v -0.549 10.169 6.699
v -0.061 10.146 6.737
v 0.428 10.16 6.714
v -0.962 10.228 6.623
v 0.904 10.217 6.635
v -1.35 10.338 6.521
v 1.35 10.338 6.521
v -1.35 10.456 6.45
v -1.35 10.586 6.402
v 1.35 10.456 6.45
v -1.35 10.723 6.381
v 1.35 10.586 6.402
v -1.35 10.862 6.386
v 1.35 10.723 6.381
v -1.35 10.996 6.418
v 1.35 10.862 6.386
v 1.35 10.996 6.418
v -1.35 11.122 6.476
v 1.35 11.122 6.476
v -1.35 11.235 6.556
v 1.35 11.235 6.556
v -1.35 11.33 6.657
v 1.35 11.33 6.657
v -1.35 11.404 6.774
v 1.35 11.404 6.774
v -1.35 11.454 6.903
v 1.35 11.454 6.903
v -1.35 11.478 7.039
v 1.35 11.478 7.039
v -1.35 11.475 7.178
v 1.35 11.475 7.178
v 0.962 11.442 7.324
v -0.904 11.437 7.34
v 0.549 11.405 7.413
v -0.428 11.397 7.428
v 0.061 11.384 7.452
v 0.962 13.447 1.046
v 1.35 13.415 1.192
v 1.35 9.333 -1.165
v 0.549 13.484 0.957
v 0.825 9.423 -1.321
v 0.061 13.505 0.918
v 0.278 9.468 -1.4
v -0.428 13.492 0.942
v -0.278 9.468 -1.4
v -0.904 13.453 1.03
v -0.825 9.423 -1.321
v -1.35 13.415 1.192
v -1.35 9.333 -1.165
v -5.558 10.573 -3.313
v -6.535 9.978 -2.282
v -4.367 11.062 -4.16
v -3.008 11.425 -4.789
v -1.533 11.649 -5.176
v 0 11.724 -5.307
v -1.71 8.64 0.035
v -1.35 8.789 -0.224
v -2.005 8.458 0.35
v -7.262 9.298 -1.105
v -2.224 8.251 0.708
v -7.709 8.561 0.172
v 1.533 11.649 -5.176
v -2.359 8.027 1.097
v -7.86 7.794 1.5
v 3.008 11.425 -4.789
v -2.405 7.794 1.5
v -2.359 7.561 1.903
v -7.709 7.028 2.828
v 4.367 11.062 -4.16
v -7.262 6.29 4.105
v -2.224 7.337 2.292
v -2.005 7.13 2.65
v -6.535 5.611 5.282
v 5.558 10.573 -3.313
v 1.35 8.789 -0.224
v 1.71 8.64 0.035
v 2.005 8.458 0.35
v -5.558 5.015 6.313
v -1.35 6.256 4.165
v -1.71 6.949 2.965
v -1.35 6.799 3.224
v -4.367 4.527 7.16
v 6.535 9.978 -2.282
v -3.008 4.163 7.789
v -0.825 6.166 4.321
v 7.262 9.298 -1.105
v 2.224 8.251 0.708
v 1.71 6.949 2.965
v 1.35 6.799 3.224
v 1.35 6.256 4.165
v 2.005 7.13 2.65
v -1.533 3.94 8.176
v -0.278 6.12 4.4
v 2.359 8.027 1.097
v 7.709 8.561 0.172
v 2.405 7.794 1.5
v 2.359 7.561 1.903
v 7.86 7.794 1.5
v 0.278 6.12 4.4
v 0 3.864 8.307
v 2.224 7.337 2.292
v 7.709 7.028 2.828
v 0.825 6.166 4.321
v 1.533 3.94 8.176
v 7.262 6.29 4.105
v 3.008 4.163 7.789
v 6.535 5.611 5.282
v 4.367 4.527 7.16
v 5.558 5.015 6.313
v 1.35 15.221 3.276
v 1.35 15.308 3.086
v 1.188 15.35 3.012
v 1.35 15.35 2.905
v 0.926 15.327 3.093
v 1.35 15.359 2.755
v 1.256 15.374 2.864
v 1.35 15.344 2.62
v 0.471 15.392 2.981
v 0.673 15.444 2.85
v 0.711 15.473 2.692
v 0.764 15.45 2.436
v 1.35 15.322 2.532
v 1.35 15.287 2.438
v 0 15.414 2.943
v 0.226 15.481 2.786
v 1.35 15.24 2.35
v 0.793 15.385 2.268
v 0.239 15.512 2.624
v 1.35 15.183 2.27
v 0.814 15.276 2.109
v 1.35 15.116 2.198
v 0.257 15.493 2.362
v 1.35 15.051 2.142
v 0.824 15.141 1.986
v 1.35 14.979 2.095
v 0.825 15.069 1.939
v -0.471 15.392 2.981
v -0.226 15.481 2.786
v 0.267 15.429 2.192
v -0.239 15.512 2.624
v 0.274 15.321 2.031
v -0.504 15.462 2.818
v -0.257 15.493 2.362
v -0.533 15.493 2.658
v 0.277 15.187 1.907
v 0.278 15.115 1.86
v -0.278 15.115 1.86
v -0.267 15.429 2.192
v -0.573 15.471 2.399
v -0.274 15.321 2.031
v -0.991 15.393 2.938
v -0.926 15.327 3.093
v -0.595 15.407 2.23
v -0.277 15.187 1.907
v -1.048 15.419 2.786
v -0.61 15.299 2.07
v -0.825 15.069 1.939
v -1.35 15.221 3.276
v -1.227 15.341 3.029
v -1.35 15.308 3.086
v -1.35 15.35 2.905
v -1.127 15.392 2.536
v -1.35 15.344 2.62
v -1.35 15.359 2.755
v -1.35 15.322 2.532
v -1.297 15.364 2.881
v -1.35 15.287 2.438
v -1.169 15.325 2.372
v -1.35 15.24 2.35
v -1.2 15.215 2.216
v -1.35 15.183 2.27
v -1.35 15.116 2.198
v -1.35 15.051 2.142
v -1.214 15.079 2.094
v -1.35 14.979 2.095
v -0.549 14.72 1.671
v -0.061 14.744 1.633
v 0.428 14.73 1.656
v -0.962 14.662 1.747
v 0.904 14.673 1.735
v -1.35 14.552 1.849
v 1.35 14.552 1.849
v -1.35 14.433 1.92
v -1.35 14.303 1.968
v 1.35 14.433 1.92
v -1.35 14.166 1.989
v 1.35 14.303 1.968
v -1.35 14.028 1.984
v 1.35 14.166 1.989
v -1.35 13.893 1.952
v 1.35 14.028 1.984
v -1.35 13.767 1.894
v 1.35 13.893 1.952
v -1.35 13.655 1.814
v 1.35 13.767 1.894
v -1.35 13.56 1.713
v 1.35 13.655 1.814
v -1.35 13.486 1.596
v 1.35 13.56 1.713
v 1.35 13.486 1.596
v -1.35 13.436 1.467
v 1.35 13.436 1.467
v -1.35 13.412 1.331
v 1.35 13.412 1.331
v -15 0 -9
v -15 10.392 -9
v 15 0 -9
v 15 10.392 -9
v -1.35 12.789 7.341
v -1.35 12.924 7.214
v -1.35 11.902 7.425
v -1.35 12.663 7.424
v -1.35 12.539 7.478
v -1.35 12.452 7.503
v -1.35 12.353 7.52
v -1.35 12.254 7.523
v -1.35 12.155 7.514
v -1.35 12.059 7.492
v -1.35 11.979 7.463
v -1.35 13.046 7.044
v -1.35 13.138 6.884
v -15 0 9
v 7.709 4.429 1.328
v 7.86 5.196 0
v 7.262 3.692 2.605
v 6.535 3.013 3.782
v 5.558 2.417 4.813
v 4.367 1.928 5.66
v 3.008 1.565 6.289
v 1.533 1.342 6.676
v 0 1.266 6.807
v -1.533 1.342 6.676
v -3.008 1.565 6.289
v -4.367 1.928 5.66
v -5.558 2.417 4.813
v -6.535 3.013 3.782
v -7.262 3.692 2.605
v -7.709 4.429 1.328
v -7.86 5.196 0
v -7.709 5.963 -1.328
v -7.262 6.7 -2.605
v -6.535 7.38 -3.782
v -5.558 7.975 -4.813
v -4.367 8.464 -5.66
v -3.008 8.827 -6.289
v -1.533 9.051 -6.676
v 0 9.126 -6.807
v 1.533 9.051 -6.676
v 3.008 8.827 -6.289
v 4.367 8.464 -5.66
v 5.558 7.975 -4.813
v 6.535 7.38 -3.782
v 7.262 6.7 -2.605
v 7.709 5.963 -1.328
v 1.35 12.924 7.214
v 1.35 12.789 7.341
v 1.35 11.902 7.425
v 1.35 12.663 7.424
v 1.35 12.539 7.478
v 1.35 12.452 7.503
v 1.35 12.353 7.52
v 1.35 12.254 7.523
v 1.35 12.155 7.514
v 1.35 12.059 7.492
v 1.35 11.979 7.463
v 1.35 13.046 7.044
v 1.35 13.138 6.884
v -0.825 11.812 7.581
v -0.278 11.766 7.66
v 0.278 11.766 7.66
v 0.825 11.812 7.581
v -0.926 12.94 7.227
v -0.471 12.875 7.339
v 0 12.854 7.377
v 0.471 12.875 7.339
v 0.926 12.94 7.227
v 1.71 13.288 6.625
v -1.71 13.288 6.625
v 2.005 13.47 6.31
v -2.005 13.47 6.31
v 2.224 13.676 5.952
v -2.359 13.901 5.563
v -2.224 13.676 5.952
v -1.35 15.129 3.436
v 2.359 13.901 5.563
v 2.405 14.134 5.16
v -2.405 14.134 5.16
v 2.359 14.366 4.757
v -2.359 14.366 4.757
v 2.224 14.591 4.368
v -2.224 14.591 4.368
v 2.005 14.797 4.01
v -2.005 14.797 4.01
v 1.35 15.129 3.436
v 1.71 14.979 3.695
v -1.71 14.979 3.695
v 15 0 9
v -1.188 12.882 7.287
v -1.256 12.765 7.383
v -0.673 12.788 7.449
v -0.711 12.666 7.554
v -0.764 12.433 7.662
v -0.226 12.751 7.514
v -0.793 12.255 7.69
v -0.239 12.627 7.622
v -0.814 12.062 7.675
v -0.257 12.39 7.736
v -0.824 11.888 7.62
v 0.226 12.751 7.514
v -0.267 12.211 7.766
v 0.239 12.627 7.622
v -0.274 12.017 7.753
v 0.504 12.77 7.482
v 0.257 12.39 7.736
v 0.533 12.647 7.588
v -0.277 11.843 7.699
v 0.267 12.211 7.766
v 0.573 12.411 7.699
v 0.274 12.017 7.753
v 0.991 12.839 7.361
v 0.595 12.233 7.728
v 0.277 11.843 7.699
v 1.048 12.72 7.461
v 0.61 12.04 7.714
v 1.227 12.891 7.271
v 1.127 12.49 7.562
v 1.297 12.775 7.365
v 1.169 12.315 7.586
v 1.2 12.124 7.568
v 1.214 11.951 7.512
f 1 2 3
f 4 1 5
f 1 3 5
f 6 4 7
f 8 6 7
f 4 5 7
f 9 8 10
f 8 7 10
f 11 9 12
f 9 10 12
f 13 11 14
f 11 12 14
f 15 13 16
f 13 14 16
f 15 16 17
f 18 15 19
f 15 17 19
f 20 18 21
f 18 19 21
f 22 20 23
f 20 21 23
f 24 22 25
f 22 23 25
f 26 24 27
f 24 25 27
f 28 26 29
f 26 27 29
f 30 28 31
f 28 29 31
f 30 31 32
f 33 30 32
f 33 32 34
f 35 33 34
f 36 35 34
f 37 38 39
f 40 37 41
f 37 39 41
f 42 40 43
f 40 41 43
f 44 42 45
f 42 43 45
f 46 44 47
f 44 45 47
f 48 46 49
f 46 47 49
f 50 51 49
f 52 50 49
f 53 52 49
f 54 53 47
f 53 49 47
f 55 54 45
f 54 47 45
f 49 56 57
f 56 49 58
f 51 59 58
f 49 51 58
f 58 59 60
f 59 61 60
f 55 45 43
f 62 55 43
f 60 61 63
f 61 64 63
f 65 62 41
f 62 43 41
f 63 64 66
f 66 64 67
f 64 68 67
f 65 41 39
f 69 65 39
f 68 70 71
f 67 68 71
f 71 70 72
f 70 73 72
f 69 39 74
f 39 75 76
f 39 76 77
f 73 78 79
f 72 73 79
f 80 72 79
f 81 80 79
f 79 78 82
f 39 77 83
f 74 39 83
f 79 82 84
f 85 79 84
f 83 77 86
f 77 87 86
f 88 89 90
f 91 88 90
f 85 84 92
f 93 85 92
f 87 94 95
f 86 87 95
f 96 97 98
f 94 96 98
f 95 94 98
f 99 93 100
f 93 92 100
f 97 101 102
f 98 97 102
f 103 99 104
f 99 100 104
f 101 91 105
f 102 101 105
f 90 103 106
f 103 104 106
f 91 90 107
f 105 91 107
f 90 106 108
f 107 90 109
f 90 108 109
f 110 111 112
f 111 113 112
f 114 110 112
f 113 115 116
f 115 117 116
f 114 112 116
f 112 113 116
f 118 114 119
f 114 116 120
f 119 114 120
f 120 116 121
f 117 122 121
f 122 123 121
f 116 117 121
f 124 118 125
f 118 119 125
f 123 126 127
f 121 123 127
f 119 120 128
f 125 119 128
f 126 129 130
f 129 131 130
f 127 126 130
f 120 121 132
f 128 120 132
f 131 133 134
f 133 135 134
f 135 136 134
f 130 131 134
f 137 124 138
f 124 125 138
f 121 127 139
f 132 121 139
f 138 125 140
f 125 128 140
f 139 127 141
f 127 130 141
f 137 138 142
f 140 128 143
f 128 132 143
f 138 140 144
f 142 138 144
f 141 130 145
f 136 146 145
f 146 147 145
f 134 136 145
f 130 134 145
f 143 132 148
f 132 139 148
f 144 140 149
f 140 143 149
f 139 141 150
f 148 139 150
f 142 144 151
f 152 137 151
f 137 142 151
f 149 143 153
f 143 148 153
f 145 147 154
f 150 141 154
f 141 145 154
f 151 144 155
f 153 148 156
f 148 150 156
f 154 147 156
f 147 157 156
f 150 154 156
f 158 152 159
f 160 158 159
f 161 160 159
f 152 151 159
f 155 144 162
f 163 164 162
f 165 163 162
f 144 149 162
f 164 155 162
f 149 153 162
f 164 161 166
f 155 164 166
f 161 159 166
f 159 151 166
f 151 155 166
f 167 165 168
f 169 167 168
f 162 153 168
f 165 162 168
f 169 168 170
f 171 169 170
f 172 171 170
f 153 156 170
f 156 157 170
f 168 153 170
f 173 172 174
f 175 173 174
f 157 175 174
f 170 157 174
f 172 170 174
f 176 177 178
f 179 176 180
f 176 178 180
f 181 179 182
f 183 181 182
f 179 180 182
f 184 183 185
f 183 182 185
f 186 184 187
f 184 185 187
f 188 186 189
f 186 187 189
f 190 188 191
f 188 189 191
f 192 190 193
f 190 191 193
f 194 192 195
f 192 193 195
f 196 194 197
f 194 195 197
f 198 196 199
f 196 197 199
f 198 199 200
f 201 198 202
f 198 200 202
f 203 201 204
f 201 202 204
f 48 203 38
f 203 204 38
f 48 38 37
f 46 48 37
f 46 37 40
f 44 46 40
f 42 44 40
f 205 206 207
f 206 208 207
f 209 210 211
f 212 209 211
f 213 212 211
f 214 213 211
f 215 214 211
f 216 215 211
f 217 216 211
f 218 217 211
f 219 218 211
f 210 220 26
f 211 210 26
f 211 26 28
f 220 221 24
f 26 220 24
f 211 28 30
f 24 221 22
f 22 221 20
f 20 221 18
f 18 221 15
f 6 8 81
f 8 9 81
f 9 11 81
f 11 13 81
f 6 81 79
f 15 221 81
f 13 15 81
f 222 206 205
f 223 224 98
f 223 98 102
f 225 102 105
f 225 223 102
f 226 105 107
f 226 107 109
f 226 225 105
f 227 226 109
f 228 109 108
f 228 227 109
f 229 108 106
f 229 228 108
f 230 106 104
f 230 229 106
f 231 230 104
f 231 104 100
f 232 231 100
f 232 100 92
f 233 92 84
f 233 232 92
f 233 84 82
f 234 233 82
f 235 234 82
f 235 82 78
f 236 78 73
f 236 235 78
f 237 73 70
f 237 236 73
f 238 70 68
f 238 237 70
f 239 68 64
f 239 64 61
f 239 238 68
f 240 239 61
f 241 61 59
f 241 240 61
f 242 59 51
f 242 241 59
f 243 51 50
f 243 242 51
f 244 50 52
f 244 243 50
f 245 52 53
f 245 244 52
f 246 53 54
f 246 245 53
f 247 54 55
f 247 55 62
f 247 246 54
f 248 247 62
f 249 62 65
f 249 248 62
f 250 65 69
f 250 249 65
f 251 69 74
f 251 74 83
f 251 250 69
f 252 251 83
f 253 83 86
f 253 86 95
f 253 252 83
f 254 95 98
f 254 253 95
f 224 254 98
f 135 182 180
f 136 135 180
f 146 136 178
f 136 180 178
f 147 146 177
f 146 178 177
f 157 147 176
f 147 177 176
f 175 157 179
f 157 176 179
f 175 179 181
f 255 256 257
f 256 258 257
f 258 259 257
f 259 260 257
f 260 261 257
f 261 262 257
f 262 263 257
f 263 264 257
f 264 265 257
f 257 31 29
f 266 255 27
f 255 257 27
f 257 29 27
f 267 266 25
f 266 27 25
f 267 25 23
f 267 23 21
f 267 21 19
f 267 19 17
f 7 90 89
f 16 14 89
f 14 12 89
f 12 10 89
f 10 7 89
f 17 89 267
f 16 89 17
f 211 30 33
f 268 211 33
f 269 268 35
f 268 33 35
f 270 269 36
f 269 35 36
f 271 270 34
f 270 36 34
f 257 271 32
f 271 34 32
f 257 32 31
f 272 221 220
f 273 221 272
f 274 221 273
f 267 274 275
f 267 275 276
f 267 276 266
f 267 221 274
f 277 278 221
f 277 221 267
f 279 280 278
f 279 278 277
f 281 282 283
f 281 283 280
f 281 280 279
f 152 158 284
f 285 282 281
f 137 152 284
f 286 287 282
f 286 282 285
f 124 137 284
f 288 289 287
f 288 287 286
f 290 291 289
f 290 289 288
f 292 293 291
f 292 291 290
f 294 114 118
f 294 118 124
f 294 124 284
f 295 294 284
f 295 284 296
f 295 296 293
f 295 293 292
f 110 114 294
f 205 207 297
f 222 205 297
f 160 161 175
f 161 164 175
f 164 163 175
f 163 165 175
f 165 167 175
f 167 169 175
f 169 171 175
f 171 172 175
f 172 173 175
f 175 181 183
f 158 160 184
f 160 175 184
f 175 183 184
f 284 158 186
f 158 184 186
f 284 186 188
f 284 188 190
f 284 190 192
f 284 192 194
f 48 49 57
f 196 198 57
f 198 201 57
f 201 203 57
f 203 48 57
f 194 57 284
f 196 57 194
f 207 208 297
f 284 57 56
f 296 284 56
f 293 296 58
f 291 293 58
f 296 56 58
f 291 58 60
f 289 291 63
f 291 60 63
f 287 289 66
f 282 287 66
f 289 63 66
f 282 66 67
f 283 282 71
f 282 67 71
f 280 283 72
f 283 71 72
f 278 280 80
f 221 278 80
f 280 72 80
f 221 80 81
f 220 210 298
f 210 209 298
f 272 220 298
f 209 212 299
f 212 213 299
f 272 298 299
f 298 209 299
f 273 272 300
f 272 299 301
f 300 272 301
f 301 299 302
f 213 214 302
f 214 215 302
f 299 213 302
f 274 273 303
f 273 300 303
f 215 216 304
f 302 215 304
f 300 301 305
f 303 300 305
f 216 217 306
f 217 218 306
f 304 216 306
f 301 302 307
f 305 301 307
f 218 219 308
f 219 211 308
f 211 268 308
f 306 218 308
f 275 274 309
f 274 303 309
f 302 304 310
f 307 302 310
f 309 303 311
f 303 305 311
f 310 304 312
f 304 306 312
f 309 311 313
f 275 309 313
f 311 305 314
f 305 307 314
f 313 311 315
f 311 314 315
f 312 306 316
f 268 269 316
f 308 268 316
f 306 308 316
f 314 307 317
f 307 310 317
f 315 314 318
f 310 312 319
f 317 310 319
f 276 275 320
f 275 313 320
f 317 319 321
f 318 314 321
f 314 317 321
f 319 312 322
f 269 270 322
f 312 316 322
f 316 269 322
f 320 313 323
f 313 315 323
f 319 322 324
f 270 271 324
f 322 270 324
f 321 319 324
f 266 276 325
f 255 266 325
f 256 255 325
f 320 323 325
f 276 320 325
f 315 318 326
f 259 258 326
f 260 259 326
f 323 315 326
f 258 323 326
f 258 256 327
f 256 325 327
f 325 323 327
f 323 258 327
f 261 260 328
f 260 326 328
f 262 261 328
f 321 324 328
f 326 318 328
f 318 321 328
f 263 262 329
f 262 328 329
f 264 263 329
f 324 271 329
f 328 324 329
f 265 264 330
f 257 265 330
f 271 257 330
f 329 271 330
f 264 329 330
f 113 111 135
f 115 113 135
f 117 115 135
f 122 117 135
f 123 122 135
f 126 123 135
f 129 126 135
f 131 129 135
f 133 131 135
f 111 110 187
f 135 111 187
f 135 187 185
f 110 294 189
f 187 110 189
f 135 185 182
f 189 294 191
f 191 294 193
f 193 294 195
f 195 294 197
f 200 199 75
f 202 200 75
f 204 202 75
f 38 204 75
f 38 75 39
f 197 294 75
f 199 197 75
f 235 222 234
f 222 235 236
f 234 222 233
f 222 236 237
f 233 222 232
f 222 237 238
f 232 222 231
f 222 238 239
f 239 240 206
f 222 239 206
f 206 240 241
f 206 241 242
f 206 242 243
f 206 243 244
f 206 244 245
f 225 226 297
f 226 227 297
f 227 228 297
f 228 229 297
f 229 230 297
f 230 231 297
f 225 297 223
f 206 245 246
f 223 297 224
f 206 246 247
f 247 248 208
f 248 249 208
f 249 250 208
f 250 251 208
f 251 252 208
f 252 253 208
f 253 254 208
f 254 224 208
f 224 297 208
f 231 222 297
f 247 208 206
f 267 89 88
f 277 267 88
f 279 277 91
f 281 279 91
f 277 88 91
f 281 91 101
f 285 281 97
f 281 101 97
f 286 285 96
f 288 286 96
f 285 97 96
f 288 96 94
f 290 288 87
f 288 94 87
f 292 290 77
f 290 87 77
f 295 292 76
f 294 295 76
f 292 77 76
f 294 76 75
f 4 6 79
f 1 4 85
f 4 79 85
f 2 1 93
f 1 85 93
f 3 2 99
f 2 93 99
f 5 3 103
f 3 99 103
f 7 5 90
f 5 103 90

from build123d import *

# Parameters (mm, degrees)
BOSS_EXTRUDE4_DEPTH = 15
SKETCH3_R           = 7.86
BOSS_EXTRUDE2_DEPTH = 3
BOSS_EXTRUDE3_DEPTH = 7.32
SKETCH6_R           = 0.715
CUT_EXTRUDE2_DEPTH  = 17.35
FILLET5_R           = 0.8


with BuildPart() as part:
    # Sketch8 → Boss-Extrude4 (new body, symmetric)
    with BuildSketch(Plane(origin=(0, 0, 0), x_dir=(0, 0, -1), z_dir=(1, 0, 0))):
        Polygon((-9, 0), (9, 10.392304845), (9, 0), align=None)
    extrude(amount=BOSS_EXTRUDE4_DEPTH, both=True)

    # Sketch3 → Boss-Extrude2 (add)
    with BuildSketch(Plane(origin=(0, 1.640246968, 6.159008915), x_dir=(1, 0, 0), z_dir=(0, -0.866025404, -0.5))):
        with Locations((0, -7.11181091)):
            Circle(SKETCH3_R)
    extrude(amount=-BOSS_EXTRUDE2_DEPTH)

    # Sketch5 → Boss-Extrude3 (add)
    with BuildSketch(Plane(origin=(0, 6.495190528, 3.75), x_dir=(1, 0, 0), z_dir=(0, 0.866025404, 0.5))):
        with BuildLine():
            Line((1.35, 4.588434219), (1.35, 5.674941499))
            ThreePointArc((1.35, 5.674941499), (0, 5.958076211), (-1.35, 5.674941499))
            Line((-1.35, 5.674941499), (-1.35, 4.588434219))
            ThreePointArc((-1.35, 4.588434219), (-2.405, 2.598076211), (-1.35, 0.607718203))
            Line((-1.35, 0.607718203), (-1.35, -0.478789077))
            ThreePointArc((-1.35, -0.478789077), (0, -0.761923789), (1.35, -0.478789077))
            Line((1.35, -0.478789077), (1.35, 0.607718203))
            ThreePointArc((1.35, 0.607718203), (2.405, 2.598076211), (1.35, 4.588434219))
        make_face()
    extrude(amount=BOSS_EXTRUDE3_DEPTH)

    # Sketch6 → Cut-Extrude2 (cut, through all)
    with BuildSketch(Plane(origin=(1.35, 0, 0), x_dir=(0, 0, -1), z_dir=(1, 0, 0))):
        with Locations((-1.275154643, 14.124785052)):
            Circle(SKETCH6_R)
        with Locations((-7.094845357, 10.764785052)):
            Circle(SKETCH6_R)
    extrude(amount=-CUT_EXTRUDE2_DEPTH, mode=Mode.SUBTRACT)

    # Fillet5
    fillet5_edges = [part.edges().sort_by_distance(p)[0] for p in [
        (0, 12.45353459, 8.069845357),
        (0, 15.81353459, 2.250154643),
    ]]
    fillet(fillet5_edges, radius=FILLET5_R)


solid = part.part
